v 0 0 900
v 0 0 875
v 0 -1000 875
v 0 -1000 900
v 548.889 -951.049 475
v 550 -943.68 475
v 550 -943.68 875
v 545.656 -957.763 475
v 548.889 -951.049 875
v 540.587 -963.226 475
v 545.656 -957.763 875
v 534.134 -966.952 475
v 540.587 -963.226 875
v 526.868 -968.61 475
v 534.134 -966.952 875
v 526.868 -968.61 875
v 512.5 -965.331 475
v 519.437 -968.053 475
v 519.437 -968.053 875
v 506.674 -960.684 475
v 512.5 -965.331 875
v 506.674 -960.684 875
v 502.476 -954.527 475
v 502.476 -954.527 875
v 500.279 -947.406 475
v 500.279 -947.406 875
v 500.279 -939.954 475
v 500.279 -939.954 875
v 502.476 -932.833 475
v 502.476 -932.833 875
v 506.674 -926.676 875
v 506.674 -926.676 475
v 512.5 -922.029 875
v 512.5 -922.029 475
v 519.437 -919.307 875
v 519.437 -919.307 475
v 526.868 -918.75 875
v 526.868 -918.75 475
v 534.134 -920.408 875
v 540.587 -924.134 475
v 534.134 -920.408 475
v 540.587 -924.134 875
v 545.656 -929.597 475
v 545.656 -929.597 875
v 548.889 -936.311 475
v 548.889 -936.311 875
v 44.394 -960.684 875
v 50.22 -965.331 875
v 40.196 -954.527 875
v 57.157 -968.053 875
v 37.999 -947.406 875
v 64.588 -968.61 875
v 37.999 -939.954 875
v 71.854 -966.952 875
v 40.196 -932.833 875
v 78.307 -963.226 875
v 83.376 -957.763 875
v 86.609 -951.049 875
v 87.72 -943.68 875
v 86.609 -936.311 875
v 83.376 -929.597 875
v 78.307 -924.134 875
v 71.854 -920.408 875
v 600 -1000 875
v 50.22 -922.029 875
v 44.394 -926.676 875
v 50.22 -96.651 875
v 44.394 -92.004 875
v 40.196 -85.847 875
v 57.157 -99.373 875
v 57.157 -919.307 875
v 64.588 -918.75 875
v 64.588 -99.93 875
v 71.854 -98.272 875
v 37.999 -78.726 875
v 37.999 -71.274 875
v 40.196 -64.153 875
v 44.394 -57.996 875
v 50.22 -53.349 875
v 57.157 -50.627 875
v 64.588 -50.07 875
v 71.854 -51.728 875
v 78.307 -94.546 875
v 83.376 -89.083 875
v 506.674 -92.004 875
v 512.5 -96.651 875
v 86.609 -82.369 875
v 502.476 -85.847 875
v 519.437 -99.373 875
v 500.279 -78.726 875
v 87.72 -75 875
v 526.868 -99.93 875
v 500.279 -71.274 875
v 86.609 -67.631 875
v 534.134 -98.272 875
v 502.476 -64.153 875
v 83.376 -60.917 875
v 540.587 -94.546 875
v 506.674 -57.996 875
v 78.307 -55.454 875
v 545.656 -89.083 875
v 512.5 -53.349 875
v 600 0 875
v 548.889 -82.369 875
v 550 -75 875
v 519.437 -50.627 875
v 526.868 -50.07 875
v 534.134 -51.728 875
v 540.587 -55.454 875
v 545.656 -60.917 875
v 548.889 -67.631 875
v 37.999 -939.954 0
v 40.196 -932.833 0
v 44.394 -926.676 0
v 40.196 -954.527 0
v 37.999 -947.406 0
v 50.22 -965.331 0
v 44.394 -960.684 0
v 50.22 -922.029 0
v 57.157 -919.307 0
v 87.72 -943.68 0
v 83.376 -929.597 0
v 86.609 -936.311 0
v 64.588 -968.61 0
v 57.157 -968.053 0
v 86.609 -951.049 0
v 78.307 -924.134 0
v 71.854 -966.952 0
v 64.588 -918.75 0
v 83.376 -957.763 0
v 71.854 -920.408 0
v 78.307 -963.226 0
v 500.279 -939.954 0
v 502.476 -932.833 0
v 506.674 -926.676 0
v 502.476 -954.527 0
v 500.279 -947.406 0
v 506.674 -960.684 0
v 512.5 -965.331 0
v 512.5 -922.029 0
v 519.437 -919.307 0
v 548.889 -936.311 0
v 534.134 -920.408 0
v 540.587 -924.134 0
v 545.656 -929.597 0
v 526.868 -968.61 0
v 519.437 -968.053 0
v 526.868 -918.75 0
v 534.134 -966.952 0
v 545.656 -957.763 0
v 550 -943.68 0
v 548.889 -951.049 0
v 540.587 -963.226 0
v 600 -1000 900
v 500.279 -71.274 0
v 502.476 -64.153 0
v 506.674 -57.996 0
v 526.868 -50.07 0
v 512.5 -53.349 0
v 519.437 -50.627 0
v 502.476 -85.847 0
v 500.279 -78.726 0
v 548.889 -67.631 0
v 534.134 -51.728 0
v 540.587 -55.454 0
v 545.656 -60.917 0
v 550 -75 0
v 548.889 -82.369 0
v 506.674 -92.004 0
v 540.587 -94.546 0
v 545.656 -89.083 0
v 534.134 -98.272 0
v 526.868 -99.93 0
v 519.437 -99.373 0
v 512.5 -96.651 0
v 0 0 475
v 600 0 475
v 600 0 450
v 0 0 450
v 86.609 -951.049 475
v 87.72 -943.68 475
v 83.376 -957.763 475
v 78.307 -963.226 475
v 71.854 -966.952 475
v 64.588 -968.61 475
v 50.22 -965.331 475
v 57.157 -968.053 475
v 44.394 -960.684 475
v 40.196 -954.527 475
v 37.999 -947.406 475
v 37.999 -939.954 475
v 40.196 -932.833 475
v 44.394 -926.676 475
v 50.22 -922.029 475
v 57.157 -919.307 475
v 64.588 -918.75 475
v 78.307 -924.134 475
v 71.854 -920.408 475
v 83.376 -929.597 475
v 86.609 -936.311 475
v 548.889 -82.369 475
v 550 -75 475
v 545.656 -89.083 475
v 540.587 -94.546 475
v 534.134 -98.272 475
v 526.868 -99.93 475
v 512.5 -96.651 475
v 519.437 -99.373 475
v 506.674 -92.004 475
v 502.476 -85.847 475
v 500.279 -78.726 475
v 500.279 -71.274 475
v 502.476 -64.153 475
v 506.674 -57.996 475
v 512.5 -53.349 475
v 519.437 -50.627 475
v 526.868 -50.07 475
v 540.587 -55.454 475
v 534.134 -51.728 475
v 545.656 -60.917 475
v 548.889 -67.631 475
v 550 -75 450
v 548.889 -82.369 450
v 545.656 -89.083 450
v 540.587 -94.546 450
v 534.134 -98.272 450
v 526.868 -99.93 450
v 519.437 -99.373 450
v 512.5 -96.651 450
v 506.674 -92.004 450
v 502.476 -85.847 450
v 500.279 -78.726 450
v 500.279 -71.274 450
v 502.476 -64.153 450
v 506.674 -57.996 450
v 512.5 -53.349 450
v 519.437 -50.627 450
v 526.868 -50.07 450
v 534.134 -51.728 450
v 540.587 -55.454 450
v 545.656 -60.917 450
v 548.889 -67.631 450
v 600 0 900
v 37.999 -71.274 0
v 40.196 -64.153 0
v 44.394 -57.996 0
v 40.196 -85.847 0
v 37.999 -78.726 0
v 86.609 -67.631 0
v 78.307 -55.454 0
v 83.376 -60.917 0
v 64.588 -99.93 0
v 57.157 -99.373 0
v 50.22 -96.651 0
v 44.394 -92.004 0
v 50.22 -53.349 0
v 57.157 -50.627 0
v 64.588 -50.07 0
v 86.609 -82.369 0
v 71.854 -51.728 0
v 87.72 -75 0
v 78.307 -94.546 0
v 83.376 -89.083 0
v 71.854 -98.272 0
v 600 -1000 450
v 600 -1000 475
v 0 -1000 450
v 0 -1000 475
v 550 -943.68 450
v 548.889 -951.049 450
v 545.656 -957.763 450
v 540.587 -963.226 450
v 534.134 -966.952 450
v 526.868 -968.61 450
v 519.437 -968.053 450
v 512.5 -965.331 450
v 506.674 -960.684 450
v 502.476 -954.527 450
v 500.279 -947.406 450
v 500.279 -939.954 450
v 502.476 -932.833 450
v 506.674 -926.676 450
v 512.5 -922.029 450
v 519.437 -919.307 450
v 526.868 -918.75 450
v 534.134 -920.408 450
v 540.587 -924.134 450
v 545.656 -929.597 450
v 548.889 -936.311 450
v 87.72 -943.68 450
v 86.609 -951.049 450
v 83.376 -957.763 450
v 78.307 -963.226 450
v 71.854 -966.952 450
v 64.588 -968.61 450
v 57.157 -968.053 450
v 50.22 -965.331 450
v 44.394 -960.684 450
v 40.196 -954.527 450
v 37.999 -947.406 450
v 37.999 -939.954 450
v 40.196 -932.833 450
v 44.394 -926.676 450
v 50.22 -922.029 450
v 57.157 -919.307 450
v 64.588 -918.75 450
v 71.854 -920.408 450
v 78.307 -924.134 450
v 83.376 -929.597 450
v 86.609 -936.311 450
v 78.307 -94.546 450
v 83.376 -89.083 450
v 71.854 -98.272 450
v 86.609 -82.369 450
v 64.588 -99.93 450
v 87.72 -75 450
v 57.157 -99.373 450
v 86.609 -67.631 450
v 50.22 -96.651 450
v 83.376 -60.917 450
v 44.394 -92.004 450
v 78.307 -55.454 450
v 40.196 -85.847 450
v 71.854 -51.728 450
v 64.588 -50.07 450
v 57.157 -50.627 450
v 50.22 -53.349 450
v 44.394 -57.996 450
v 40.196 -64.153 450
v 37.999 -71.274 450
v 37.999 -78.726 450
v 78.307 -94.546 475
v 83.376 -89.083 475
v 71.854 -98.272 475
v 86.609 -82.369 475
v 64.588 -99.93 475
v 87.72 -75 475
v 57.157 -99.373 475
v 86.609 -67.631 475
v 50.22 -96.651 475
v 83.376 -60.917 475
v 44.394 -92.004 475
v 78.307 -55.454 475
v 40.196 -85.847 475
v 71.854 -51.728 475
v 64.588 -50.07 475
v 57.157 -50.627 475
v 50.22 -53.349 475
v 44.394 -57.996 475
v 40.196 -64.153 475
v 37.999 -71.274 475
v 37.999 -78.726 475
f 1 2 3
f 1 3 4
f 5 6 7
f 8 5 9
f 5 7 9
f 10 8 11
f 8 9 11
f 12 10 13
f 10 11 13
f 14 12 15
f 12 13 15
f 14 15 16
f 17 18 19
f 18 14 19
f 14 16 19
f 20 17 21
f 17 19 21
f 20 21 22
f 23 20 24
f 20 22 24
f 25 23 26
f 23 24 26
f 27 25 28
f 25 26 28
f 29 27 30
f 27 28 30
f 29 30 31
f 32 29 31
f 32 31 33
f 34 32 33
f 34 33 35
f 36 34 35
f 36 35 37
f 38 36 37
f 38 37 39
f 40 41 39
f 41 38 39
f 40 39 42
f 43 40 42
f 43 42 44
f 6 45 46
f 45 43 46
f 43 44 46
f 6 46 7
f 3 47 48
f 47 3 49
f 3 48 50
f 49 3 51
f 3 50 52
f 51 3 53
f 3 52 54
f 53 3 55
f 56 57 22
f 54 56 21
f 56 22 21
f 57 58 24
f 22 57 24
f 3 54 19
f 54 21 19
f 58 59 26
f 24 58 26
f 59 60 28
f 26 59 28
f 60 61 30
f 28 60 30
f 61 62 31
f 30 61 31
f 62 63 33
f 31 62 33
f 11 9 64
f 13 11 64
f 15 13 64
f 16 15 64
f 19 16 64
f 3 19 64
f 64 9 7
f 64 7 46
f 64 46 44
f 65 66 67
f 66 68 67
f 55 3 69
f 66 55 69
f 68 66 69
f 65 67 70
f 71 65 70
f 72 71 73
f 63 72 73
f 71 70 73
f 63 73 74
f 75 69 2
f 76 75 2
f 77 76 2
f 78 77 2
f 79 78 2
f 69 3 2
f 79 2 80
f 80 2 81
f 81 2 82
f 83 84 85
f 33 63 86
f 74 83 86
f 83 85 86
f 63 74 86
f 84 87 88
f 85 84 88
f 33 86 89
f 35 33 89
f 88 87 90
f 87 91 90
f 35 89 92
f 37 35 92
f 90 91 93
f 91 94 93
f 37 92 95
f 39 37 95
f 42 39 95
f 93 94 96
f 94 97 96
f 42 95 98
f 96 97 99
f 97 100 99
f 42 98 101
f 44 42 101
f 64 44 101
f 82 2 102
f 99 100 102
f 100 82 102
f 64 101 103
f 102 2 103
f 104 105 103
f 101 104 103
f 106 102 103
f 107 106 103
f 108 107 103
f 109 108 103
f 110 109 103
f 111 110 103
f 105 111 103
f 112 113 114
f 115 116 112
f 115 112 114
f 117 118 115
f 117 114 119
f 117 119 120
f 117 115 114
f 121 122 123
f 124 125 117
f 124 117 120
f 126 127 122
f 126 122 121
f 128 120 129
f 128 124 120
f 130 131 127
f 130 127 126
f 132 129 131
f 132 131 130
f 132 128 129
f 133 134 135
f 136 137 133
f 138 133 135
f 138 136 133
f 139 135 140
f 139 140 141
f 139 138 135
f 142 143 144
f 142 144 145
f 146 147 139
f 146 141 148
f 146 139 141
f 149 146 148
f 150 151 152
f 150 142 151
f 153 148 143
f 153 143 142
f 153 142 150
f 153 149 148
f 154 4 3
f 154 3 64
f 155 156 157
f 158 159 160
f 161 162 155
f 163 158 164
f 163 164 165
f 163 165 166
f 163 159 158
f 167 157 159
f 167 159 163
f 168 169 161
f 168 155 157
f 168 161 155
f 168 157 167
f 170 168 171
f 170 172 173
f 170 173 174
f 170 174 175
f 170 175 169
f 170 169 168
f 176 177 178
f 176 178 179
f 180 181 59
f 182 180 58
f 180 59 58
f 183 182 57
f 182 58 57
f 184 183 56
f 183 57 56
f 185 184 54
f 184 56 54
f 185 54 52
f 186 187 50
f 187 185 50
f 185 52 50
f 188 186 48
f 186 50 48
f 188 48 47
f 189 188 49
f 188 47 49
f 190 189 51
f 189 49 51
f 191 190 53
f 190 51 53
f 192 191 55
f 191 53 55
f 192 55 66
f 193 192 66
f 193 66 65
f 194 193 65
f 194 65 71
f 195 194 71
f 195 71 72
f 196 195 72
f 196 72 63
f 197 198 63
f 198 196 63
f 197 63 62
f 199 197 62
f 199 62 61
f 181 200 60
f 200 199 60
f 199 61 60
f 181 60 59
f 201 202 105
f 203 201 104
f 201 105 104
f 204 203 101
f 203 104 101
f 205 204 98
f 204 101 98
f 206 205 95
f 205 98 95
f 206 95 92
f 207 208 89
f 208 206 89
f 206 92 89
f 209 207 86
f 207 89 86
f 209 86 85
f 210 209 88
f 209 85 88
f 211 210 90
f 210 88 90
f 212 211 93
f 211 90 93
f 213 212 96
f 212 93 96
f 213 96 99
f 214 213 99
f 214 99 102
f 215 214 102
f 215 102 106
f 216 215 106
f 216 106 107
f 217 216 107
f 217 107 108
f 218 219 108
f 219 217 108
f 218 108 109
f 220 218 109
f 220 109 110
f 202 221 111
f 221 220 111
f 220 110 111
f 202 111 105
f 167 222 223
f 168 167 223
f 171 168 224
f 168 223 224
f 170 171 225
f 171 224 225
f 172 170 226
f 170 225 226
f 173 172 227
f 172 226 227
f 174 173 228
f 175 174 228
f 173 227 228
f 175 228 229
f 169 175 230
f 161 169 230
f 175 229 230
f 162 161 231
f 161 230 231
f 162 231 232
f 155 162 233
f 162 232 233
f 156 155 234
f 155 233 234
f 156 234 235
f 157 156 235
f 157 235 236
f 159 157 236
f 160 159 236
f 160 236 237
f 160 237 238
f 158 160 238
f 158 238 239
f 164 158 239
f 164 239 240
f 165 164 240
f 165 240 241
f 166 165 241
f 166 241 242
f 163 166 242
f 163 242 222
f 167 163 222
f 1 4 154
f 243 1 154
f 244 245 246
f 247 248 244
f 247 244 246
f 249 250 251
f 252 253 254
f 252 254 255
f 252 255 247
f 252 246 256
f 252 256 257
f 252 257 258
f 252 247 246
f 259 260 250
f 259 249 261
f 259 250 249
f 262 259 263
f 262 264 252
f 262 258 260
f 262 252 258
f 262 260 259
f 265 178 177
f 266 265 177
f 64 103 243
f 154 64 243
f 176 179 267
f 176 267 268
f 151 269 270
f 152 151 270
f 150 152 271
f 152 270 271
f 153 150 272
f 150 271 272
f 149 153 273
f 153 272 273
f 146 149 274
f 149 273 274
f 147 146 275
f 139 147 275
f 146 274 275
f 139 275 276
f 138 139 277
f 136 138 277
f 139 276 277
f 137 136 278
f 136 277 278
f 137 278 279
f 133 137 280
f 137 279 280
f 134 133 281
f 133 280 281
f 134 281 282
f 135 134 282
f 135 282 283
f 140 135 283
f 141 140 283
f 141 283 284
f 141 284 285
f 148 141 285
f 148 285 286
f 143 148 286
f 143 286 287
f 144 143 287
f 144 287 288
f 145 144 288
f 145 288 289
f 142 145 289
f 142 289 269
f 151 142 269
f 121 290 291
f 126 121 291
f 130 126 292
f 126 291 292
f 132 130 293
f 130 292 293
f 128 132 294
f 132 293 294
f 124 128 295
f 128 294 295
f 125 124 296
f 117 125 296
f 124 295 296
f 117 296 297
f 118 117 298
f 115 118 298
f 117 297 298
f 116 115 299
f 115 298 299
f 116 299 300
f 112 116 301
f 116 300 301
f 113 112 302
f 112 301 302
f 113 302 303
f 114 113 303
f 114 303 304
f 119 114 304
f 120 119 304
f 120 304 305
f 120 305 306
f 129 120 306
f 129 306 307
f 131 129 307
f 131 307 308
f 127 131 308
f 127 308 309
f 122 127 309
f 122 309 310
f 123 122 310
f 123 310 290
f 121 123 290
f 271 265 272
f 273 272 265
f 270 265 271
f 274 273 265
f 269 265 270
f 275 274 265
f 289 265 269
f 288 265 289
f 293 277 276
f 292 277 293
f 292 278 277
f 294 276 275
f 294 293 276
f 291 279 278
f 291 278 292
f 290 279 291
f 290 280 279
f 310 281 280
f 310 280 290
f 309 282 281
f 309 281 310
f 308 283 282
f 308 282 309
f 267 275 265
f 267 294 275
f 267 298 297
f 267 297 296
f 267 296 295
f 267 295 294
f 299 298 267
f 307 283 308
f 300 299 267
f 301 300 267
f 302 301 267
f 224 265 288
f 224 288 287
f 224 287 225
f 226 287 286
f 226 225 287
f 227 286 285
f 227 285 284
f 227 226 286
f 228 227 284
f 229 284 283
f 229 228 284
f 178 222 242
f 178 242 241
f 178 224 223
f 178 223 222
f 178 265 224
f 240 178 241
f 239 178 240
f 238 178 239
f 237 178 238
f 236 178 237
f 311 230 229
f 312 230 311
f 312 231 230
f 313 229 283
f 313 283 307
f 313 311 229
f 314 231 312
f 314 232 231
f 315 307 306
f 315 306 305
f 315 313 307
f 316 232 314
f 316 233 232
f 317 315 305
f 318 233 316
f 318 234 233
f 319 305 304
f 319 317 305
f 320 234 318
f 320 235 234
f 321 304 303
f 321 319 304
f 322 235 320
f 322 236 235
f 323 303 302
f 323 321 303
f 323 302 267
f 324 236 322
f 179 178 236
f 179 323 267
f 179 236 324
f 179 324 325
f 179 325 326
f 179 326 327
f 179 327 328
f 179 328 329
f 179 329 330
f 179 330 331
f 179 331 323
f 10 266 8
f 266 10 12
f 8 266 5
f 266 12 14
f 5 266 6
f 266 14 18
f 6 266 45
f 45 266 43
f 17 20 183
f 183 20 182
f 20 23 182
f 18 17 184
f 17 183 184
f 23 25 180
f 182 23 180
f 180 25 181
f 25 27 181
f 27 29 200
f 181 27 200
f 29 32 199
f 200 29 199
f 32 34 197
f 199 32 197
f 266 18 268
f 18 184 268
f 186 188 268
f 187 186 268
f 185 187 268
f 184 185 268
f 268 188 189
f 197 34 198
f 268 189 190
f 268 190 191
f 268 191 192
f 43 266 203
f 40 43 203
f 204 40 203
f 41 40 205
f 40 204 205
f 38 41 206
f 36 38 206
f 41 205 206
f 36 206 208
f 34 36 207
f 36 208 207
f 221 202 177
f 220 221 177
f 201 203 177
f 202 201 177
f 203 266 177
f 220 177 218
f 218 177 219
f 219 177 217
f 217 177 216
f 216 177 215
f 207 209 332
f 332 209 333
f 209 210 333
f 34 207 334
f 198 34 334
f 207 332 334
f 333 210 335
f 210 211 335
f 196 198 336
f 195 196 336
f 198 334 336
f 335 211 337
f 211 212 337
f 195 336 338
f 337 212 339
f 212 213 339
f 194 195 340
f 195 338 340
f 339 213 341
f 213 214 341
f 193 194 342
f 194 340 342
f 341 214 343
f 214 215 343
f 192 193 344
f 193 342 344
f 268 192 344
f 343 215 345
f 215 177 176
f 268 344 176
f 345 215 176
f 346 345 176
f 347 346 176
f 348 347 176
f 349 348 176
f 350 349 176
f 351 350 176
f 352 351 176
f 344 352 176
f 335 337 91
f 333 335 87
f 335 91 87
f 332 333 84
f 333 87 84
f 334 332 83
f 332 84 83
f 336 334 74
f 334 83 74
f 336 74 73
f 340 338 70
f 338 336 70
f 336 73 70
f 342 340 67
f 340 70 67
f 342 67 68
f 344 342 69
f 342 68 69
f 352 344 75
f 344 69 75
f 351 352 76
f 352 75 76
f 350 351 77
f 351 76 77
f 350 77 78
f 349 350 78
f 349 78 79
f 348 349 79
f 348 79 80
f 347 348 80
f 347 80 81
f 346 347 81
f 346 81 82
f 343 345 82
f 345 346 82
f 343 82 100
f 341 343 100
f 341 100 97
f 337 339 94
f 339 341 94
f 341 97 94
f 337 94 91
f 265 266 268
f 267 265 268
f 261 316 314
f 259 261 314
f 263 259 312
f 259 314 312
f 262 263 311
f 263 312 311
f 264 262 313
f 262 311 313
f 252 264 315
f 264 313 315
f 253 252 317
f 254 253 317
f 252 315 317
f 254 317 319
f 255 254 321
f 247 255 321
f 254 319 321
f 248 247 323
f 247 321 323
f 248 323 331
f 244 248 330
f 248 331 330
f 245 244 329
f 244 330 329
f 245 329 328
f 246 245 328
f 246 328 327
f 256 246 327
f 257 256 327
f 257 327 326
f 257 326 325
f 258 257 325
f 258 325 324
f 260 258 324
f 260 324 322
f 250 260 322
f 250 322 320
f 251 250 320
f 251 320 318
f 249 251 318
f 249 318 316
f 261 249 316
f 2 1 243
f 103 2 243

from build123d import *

# Parameters (mm, degrees)
F0_W     = 600
F0_H     = 25
F1_DEPTH = 1000
F2_R     = 25
F3_DEPTH = 875
F4_W     = 600
F4_H     = 25
F5_DEPTH = 1000


with BuildPart() as f1:
    # F0 (on Front) → F1 (new body)
    with BuildSketch(Plane.XZ):
        with Locations((300, 887.5)):
            Rectangle(F0_W, F0_H)
    extrude(amount=F1_DEPTH)

    # F2 (on face) → F3 (join)
    with BuildSketch(Plane(origin=(0, 0, 875), x_dir=(1, 0, 0), z_dir=(0, 0, -1))):
        with Locations((525, 75)):
            Circle(F2_R)
        with Locations((62.72, 75)):
            Circle(F2_R)
        with Locations((525, 943.68)):
            Circle(F2_R)
        with Locations((62.72, 943.68)):
            Circle(F2_R)
    extrude(amount=F3_DEPTH)

    # F4 (on face) → F5 (join)
    with BuildSketch(Plane(origin=(0, 0, 0), x_dir=(-1, 0, 0), z_dir=(0, 1, 0))):
        with Locations((-300, 462.5)):
            Rectangle(F4_W, F4_H)
    extrude(amount=-F5_DEPTH)


solid = f1.part
